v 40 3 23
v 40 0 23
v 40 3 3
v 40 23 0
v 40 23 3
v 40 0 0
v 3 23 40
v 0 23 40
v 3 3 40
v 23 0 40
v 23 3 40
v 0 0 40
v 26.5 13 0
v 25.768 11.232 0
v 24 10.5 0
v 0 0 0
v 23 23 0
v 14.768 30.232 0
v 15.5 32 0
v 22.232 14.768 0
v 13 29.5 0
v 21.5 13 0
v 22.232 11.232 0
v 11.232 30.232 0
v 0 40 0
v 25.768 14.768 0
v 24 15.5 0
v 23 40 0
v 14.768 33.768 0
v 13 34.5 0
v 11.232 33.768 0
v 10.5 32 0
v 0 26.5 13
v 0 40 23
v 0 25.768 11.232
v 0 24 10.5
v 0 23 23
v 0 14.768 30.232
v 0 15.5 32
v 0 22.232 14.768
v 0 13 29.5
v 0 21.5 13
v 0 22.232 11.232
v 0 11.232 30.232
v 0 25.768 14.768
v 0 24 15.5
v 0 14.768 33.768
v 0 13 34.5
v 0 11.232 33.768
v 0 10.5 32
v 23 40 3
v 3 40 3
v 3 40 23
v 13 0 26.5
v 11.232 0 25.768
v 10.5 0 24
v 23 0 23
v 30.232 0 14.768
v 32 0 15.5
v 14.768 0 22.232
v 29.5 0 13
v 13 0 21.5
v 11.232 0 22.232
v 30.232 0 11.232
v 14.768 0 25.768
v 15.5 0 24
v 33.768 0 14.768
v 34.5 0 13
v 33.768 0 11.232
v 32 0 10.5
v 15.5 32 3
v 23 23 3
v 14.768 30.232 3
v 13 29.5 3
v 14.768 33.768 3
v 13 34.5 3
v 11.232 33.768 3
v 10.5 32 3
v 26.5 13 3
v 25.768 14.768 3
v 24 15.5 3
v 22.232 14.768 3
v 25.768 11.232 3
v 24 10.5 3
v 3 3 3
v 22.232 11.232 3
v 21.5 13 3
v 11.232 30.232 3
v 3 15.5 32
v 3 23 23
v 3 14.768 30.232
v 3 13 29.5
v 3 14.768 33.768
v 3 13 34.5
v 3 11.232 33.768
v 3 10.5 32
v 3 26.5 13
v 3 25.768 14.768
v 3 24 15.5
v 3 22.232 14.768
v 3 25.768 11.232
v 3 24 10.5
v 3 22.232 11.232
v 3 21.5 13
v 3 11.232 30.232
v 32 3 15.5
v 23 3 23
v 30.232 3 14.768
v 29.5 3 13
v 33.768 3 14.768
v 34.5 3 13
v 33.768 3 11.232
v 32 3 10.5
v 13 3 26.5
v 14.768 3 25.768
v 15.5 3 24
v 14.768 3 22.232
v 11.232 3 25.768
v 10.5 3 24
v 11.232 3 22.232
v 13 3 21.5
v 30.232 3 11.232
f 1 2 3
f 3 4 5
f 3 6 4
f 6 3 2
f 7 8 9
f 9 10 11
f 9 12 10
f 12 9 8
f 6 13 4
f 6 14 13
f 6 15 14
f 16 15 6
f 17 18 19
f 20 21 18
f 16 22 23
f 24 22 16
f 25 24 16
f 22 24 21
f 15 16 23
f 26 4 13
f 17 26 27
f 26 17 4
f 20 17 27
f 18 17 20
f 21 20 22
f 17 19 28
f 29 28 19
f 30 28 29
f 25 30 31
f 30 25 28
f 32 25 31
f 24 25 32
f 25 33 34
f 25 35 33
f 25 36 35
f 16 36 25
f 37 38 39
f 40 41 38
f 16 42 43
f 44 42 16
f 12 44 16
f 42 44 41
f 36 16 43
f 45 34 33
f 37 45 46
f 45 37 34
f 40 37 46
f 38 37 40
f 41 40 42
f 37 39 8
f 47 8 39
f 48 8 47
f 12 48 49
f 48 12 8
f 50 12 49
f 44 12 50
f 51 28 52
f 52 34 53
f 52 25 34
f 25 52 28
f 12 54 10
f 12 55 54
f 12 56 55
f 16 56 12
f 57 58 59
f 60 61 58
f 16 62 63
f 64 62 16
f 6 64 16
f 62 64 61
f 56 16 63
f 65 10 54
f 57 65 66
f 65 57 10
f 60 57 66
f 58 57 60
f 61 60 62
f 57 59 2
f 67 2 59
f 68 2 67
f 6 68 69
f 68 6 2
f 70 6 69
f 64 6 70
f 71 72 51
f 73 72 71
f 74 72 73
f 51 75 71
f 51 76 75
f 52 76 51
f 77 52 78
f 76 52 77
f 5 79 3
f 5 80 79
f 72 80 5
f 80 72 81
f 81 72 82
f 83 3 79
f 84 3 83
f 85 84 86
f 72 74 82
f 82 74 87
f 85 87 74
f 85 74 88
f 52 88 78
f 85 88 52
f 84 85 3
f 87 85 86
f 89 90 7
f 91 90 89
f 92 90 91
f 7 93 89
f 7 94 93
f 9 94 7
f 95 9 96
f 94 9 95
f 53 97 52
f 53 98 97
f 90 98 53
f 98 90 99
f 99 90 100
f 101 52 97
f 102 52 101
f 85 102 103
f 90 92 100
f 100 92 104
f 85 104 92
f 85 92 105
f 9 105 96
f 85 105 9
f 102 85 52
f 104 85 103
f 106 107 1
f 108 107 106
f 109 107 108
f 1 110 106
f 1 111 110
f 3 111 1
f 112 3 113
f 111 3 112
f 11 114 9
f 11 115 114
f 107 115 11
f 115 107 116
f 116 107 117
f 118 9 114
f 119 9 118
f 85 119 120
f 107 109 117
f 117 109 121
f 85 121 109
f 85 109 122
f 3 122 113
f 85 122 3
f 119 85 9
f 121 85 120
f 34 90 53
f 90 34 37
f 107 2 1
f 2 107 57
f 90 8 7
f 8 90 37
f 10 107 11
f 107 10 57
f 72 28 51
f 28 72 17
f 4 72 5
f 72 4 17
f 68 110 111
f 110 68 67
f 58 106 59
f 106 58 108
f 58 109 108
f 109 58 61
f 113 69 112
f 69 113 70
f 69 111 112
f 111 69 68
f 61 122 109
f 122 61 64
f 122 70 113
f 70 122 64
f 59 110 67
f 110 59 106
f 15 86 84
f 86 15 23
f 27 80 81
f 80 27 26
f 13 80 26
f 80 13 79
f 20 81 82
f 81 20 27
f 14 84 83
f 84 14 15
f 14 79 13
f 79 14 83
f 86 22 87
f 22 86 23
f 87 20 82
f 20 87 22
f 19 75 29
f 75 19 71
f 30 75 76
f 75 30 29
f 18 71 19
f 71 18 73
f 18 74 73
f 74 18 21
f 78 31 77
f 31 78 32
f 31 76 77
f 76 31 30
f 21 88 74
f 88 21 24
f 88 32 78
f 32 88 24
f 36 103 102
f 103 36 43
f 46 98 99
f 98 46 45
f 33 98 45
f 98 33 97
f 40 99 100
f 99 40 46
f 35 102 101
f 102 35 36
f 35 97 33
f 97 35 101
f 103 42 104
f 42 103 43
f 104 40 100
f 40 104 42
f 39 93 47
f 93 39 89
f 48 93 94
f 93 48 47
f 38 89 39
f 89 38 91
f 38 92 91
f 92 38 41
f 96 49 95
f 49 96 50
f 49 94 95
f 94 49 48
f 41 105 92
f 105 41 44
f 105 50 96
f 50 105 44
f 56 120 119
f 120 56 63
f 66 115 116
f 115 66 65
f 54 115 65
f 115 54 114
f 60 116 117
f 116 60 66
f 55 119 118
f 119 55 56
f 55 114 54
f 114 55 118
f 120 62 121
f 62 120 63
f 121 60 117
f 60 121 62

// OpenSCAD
// Parametric bracket for robot chasis.
// Nick Pascucci
// December, 2011

bracket();

module bracket(){
       length = 40;
       arm_thickness = 3;
       arm_width = 23;
       hole_d1 = .8 * length;
       hole_d2 = .6 * length;
       hole_size = 2.5;
       cut_depth = length - arm_thickness;
       hole_offset = arm_width + (length - cut_depth);


       difference(){
              base_cube(length, cut_depth);
              cut_arms(length, cut_depth, arm_width);
              holes(hole_d1, hole_d2, hole_offset, hole_size);
       }
}

module base_cube(length, arm_length){
	hole_location = (length - arm_length) + (arm_length/2);

	difference(){
		cube([length, length, length], center=false);
		translate(v=[length-arm_length, length-arm_length, length-arm_length]){
			cube([arm_length+1, arm_length+1, arm_length+1], center=false);
		}
	}

}

module cut_arms(length, arm_length, arm_thickness){
       		translate(v=[-(length-arm_length), -(length-arm_length), -(length-arm_length)]);
		translate(v=[-length, arm_thickness, arm_thickness]){
			cube([2 * length, length-arm_thickness + 1, length-arm_thickness + 1,]);
		}
       		translate(v=[arm_thickness, -length, arm_thickness]){
			cube([length-arm_thickness + 1, 2 * length, length-arm_thickness + 1,]);
		}
       		translate(v=[arm_thickness, arm_thickness, -length]){
			cube([length-arm_thickness + 1, length-arm_thickness + 1, 2 * length]);
		}
}

module holes(d1, d2, offset, hole_size){
       hole_pair(d1, d2, offset, hole_size);
       rotate([90, 0, 90]) hole_pair(d1, d2, offset, hole_size);
       rotate([-90, -90, 0]) hole_pair(d1, d2, offset, hole_size);
}

module hole_pair(d1, d2, offset, hole_size){
       translate([d1, offset/2, offset/2]){
              rotate([90, 0, 0]){
                   cylinder(h=offset, r=hole_size, center=false);
              }
       }
       translate([d2, offset/2, -offset/2]){
              rotate([0, 0, 0]){
                   cylinder(h=offset, r=hole_size, center=false);
              }
       }
}
